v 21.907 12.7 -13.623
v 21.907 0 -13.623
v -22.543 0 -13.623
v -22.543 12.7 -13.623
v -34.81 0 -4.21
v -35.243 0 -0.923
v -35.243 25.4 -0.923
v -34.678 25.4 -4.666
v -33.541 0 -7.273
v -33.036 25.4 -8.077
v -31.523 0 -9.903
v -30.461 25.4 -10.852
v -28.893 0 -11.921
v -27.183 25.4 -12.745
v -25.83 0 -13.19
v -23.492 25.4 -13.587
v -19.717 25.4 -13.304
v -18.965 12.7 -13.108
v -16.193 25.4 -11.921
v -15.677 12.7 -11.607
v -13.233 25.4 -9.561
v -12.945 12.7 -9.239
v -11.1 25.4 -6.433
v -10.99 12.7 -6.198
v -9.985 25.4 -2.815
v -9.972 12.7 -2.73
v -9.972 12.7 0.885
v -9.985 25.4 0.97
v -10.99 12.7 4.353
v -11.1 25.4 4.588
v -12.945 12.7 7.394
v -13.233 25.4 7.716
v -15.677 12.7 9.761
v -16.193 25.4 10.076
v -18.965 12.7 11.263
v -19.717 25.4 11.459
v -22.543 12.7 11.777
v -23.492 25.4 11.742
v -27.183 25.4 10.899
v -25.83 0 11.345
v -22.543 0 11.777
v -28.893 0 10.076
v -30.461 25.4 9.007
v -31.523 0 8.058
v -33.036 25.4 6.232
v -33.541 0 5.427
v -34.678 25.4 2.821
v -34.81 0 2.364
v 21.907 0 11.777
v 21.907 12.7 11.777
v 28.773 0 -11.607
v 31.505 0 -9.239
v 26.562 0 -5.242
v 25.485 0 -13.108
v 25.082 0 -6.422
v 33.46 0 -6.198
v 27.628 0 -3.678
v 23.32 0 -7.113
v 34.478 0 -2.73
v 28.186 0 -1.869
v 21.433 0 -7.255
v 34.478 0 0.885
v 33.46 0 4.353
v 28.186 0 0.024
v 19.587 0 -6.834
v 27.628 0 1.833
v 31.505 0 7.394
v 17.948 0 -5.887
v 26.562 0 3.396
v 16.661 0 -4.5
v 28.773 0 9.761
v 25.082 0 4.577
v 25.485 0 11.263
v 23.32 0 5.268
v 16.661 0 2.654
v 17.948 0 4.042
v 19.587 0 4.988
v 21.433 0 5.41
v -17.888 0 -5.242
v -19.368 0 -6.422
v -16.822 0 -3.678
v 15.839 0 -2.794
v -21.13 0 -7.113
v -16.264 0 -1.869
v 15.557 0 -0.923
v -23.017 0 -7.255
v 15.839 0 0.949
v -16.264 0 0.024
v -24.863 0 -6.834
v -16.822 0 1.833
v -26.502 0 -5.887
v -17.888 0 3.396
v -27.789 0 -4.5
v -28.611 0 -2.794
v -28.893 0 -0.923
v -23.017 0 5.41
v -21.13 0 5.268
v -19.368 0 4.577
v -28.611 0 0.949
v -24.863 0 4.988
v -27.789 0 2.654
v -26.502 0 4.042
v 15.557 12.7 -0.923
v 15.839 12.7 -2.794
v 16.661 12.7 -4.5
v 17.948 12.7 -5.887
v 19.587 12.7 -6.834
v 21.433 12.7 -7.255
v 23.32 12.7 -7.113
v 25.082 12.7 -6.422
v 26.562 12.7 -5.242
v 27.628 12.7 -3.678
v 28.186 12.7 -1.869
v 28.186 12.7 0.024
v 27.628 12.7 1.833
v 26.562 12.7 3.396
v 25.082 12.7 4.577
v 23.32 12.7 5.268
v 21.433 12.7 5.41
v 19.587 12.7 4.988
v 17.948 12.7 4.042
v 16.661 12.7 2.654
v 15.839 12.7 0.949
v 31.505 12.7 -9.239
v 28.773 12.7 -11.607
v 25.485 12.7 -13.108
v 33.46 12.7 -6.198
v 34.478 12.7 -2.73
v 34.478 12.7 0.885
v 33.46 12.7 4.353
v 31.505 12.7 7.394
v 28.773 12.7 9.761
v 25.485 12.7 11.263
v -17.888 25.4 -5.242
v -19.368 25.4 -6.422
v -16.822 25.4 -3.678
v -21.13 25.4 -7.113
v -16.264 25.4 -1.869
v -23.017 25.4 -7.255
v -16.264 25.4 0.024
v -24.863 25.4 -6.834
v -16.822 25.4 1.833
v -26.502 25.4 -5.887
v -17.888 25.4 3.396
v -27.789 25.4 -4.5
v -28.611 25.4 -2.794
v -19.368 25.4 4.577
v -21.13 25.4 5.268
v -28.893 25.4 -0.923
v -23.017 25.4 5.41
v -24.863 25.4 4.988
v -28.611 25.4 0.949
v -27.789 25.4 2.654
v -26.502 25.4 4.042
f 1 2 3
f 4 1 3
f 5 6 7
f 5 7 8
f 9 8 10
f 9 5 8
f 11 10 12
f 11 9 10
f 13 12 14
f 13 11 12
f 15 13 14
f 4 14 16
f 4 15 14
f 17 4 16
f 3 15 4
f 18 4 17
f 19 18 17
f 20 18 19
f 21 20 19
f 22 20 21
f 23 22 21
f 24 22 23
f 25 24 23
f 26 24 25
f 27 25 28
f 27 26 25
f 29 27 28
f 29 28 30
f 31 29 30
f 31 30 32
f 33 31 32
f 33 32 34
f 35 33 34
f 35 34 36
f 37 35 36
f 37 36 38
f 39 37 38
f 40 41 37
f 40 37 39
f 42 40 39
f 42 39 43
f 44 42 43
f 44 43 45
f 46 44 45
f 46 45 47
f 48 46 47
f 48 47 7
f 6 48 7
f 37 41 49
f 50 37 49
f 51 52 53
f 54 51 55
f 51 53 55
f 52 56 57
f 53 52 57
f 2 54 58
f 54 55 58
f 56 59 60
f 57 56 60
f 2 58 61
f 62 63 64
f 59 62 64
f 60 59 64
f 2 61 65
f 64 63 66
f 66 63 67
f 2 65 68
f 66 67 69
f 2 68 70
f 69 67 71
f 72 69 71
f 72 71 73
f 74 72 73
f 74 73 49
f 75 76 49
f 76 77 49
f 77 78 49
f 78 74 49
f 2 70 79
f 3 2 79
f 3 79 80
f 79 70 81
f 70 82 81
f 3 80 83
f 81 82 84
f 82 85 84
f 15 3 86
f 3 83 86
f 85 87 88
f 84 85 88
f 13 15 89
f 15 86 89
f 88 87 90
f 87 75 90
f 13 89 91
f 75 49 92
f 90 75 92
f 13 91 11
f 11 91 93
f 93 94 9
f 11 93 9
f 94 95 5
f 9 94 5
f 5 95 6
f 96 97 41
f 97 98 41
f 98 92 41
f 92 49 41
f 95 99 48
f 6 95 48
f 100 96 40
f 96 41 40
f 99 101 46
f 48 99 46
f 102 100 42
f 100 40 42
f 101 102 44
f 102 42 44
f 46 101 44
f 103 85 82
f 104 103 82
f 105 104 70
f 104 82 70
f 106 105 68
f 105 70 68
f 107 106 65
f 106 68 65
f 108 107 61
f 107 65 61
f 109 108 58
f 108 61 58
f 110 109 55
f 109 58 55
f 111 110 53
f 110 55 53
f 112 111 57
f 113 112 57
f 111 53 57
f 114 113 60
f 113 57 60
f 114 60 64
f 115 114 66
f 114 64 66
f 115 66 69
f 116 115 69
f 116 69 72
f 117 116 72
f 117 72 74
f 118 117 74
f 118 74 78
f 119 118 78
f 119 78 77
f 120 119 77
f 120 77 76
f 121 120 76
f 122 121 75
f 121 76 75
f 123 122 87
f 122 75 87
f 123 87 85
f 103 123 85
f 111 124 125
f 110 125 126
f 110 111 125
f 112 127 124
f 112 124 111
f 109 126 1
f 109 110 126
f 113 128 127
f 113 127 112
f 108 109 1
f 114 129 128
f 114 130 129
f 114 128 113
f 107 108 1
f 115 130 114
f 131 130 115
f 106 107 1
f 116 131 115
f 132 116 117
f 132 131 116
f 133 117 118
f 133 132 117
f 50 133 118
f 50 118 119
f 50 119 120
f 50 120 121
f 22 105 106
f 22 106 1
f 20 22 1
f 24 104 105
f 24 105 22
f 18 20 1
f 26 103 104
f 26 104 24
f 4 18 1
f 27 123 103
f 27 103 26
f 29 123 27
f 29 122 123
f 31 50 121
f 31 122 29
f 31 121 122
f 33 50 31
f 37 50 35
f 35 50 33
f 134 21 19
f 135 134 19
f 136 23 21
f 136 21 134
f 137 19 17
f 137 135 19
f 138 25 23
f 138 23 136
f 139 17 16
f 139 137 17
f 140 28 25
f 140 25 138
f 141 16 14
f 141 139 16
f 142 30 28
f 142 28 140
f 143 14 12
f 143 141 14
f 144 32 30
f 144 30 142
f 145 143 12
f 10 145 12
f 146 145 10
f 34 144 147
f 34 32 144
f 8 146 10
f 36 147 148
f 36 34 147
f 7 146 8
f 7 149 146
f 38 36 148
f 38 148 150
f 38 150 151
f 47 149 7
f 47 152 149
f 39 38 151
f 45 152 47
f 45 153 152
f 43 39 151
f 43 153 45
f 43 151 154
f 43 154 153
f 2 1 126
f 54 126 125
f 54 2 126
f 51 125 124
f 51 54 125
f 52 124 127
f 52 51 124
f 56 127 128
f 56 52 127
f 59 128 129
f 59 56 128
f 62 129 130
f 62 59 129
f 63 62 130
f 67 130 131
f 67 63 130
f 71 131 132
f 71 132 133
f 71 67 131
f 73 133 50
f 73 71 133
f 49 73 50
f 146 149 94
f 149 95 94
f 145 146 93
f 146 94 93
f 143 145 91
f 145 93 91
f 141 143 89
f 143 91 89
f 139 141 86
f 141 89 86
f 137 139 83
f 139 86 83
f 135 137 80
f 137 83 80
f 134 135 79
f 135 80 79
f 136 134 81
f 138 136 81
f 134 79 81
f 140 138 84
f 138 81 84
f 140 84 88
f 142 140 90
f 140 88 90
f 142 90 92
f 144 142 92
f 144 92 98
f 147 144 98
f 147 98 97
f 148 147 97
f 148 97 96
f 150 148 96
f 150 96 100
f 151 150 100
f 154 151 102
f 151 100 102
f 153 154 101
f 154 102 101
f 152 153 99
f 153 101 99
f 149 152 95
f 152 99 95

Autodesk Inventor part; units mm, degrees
ref_plane "YZ Plane" through (0, 0, 0) normal (1, 0, 0) x (0, 1, 0)
ref_plane "XZ Plane" through (0, 0, 0) normal (0, 1, 0) x (-1, 0, 0)
ref_plane "XY Plane" through (0, 0, 0) normal (0, 0, 1) x (1, 0, 0)
sketch "Sketch1" plane through (0, 0, 0) normal (0, 1, 0) x (-1, 0, 0)
  line L0 (22.5427, 11.7774) -> (-21.9073, 11.7774)
  line L1 (-21.9073, 11.7774) -> (-21.9073, -13.6226)
  line L2 (-21.9073, -13.6226) -> (22.5427, -13.6226)
  line L3 (22.5427, -13.6226) -> (22.5427, 11.7774)
  circle A0 centre (-21.9073, -0.9226) radius 12.7
  circle A1 centre (-21.9073, -0.9226) radius 6.35
  circle A2 centre (22.5427, -0.9226) radius 12.7
  circle A3 centre (22.5427, -0.9226) radius 6.35
  point P0 (0, 0)
  dimension "d0" = 44.45
  dimension "d1" = 25.4
  dimension "d5" = 12.7
  dimension "d8" = 25.4
  dimension "d9" = 12.7
extrude "Extrusion2" add sketch "Sketch1" along normal blind 12.7 contours A2 L2 A0 L0 | L3 A3 A2 | A0 L1 A1 | L3 A3 | A1 L1 picked at (21.023, -11.3214) picked at (-14.3032, 6.3463) picked at (19.6489, 0.8427) picked at (-19.8437, -0.4516)
extrude "Extrusion3" add sketch "Sketch1" along normal blind 12.7 contours A0 L1 A1 | L1 A1 A0
extrude "Extrusion4" cut sketch "Sketch1" along normal blind 12.7 contours A1 L1 | L1 A1
extrude "Extrusion5" add sketch "Sketch1" along normal blind 25.4 contours A2 L3 A3 | L3 A3 A2
extrude "Extrusion6" cut sketch "Sketch1" against normal blind 25.4 contours A3 L3 | L3 A3
extrude "Extrusion7" cut sketch "Sketch1" along normal blind 25.4 contours A3 L3 | L3 A3
